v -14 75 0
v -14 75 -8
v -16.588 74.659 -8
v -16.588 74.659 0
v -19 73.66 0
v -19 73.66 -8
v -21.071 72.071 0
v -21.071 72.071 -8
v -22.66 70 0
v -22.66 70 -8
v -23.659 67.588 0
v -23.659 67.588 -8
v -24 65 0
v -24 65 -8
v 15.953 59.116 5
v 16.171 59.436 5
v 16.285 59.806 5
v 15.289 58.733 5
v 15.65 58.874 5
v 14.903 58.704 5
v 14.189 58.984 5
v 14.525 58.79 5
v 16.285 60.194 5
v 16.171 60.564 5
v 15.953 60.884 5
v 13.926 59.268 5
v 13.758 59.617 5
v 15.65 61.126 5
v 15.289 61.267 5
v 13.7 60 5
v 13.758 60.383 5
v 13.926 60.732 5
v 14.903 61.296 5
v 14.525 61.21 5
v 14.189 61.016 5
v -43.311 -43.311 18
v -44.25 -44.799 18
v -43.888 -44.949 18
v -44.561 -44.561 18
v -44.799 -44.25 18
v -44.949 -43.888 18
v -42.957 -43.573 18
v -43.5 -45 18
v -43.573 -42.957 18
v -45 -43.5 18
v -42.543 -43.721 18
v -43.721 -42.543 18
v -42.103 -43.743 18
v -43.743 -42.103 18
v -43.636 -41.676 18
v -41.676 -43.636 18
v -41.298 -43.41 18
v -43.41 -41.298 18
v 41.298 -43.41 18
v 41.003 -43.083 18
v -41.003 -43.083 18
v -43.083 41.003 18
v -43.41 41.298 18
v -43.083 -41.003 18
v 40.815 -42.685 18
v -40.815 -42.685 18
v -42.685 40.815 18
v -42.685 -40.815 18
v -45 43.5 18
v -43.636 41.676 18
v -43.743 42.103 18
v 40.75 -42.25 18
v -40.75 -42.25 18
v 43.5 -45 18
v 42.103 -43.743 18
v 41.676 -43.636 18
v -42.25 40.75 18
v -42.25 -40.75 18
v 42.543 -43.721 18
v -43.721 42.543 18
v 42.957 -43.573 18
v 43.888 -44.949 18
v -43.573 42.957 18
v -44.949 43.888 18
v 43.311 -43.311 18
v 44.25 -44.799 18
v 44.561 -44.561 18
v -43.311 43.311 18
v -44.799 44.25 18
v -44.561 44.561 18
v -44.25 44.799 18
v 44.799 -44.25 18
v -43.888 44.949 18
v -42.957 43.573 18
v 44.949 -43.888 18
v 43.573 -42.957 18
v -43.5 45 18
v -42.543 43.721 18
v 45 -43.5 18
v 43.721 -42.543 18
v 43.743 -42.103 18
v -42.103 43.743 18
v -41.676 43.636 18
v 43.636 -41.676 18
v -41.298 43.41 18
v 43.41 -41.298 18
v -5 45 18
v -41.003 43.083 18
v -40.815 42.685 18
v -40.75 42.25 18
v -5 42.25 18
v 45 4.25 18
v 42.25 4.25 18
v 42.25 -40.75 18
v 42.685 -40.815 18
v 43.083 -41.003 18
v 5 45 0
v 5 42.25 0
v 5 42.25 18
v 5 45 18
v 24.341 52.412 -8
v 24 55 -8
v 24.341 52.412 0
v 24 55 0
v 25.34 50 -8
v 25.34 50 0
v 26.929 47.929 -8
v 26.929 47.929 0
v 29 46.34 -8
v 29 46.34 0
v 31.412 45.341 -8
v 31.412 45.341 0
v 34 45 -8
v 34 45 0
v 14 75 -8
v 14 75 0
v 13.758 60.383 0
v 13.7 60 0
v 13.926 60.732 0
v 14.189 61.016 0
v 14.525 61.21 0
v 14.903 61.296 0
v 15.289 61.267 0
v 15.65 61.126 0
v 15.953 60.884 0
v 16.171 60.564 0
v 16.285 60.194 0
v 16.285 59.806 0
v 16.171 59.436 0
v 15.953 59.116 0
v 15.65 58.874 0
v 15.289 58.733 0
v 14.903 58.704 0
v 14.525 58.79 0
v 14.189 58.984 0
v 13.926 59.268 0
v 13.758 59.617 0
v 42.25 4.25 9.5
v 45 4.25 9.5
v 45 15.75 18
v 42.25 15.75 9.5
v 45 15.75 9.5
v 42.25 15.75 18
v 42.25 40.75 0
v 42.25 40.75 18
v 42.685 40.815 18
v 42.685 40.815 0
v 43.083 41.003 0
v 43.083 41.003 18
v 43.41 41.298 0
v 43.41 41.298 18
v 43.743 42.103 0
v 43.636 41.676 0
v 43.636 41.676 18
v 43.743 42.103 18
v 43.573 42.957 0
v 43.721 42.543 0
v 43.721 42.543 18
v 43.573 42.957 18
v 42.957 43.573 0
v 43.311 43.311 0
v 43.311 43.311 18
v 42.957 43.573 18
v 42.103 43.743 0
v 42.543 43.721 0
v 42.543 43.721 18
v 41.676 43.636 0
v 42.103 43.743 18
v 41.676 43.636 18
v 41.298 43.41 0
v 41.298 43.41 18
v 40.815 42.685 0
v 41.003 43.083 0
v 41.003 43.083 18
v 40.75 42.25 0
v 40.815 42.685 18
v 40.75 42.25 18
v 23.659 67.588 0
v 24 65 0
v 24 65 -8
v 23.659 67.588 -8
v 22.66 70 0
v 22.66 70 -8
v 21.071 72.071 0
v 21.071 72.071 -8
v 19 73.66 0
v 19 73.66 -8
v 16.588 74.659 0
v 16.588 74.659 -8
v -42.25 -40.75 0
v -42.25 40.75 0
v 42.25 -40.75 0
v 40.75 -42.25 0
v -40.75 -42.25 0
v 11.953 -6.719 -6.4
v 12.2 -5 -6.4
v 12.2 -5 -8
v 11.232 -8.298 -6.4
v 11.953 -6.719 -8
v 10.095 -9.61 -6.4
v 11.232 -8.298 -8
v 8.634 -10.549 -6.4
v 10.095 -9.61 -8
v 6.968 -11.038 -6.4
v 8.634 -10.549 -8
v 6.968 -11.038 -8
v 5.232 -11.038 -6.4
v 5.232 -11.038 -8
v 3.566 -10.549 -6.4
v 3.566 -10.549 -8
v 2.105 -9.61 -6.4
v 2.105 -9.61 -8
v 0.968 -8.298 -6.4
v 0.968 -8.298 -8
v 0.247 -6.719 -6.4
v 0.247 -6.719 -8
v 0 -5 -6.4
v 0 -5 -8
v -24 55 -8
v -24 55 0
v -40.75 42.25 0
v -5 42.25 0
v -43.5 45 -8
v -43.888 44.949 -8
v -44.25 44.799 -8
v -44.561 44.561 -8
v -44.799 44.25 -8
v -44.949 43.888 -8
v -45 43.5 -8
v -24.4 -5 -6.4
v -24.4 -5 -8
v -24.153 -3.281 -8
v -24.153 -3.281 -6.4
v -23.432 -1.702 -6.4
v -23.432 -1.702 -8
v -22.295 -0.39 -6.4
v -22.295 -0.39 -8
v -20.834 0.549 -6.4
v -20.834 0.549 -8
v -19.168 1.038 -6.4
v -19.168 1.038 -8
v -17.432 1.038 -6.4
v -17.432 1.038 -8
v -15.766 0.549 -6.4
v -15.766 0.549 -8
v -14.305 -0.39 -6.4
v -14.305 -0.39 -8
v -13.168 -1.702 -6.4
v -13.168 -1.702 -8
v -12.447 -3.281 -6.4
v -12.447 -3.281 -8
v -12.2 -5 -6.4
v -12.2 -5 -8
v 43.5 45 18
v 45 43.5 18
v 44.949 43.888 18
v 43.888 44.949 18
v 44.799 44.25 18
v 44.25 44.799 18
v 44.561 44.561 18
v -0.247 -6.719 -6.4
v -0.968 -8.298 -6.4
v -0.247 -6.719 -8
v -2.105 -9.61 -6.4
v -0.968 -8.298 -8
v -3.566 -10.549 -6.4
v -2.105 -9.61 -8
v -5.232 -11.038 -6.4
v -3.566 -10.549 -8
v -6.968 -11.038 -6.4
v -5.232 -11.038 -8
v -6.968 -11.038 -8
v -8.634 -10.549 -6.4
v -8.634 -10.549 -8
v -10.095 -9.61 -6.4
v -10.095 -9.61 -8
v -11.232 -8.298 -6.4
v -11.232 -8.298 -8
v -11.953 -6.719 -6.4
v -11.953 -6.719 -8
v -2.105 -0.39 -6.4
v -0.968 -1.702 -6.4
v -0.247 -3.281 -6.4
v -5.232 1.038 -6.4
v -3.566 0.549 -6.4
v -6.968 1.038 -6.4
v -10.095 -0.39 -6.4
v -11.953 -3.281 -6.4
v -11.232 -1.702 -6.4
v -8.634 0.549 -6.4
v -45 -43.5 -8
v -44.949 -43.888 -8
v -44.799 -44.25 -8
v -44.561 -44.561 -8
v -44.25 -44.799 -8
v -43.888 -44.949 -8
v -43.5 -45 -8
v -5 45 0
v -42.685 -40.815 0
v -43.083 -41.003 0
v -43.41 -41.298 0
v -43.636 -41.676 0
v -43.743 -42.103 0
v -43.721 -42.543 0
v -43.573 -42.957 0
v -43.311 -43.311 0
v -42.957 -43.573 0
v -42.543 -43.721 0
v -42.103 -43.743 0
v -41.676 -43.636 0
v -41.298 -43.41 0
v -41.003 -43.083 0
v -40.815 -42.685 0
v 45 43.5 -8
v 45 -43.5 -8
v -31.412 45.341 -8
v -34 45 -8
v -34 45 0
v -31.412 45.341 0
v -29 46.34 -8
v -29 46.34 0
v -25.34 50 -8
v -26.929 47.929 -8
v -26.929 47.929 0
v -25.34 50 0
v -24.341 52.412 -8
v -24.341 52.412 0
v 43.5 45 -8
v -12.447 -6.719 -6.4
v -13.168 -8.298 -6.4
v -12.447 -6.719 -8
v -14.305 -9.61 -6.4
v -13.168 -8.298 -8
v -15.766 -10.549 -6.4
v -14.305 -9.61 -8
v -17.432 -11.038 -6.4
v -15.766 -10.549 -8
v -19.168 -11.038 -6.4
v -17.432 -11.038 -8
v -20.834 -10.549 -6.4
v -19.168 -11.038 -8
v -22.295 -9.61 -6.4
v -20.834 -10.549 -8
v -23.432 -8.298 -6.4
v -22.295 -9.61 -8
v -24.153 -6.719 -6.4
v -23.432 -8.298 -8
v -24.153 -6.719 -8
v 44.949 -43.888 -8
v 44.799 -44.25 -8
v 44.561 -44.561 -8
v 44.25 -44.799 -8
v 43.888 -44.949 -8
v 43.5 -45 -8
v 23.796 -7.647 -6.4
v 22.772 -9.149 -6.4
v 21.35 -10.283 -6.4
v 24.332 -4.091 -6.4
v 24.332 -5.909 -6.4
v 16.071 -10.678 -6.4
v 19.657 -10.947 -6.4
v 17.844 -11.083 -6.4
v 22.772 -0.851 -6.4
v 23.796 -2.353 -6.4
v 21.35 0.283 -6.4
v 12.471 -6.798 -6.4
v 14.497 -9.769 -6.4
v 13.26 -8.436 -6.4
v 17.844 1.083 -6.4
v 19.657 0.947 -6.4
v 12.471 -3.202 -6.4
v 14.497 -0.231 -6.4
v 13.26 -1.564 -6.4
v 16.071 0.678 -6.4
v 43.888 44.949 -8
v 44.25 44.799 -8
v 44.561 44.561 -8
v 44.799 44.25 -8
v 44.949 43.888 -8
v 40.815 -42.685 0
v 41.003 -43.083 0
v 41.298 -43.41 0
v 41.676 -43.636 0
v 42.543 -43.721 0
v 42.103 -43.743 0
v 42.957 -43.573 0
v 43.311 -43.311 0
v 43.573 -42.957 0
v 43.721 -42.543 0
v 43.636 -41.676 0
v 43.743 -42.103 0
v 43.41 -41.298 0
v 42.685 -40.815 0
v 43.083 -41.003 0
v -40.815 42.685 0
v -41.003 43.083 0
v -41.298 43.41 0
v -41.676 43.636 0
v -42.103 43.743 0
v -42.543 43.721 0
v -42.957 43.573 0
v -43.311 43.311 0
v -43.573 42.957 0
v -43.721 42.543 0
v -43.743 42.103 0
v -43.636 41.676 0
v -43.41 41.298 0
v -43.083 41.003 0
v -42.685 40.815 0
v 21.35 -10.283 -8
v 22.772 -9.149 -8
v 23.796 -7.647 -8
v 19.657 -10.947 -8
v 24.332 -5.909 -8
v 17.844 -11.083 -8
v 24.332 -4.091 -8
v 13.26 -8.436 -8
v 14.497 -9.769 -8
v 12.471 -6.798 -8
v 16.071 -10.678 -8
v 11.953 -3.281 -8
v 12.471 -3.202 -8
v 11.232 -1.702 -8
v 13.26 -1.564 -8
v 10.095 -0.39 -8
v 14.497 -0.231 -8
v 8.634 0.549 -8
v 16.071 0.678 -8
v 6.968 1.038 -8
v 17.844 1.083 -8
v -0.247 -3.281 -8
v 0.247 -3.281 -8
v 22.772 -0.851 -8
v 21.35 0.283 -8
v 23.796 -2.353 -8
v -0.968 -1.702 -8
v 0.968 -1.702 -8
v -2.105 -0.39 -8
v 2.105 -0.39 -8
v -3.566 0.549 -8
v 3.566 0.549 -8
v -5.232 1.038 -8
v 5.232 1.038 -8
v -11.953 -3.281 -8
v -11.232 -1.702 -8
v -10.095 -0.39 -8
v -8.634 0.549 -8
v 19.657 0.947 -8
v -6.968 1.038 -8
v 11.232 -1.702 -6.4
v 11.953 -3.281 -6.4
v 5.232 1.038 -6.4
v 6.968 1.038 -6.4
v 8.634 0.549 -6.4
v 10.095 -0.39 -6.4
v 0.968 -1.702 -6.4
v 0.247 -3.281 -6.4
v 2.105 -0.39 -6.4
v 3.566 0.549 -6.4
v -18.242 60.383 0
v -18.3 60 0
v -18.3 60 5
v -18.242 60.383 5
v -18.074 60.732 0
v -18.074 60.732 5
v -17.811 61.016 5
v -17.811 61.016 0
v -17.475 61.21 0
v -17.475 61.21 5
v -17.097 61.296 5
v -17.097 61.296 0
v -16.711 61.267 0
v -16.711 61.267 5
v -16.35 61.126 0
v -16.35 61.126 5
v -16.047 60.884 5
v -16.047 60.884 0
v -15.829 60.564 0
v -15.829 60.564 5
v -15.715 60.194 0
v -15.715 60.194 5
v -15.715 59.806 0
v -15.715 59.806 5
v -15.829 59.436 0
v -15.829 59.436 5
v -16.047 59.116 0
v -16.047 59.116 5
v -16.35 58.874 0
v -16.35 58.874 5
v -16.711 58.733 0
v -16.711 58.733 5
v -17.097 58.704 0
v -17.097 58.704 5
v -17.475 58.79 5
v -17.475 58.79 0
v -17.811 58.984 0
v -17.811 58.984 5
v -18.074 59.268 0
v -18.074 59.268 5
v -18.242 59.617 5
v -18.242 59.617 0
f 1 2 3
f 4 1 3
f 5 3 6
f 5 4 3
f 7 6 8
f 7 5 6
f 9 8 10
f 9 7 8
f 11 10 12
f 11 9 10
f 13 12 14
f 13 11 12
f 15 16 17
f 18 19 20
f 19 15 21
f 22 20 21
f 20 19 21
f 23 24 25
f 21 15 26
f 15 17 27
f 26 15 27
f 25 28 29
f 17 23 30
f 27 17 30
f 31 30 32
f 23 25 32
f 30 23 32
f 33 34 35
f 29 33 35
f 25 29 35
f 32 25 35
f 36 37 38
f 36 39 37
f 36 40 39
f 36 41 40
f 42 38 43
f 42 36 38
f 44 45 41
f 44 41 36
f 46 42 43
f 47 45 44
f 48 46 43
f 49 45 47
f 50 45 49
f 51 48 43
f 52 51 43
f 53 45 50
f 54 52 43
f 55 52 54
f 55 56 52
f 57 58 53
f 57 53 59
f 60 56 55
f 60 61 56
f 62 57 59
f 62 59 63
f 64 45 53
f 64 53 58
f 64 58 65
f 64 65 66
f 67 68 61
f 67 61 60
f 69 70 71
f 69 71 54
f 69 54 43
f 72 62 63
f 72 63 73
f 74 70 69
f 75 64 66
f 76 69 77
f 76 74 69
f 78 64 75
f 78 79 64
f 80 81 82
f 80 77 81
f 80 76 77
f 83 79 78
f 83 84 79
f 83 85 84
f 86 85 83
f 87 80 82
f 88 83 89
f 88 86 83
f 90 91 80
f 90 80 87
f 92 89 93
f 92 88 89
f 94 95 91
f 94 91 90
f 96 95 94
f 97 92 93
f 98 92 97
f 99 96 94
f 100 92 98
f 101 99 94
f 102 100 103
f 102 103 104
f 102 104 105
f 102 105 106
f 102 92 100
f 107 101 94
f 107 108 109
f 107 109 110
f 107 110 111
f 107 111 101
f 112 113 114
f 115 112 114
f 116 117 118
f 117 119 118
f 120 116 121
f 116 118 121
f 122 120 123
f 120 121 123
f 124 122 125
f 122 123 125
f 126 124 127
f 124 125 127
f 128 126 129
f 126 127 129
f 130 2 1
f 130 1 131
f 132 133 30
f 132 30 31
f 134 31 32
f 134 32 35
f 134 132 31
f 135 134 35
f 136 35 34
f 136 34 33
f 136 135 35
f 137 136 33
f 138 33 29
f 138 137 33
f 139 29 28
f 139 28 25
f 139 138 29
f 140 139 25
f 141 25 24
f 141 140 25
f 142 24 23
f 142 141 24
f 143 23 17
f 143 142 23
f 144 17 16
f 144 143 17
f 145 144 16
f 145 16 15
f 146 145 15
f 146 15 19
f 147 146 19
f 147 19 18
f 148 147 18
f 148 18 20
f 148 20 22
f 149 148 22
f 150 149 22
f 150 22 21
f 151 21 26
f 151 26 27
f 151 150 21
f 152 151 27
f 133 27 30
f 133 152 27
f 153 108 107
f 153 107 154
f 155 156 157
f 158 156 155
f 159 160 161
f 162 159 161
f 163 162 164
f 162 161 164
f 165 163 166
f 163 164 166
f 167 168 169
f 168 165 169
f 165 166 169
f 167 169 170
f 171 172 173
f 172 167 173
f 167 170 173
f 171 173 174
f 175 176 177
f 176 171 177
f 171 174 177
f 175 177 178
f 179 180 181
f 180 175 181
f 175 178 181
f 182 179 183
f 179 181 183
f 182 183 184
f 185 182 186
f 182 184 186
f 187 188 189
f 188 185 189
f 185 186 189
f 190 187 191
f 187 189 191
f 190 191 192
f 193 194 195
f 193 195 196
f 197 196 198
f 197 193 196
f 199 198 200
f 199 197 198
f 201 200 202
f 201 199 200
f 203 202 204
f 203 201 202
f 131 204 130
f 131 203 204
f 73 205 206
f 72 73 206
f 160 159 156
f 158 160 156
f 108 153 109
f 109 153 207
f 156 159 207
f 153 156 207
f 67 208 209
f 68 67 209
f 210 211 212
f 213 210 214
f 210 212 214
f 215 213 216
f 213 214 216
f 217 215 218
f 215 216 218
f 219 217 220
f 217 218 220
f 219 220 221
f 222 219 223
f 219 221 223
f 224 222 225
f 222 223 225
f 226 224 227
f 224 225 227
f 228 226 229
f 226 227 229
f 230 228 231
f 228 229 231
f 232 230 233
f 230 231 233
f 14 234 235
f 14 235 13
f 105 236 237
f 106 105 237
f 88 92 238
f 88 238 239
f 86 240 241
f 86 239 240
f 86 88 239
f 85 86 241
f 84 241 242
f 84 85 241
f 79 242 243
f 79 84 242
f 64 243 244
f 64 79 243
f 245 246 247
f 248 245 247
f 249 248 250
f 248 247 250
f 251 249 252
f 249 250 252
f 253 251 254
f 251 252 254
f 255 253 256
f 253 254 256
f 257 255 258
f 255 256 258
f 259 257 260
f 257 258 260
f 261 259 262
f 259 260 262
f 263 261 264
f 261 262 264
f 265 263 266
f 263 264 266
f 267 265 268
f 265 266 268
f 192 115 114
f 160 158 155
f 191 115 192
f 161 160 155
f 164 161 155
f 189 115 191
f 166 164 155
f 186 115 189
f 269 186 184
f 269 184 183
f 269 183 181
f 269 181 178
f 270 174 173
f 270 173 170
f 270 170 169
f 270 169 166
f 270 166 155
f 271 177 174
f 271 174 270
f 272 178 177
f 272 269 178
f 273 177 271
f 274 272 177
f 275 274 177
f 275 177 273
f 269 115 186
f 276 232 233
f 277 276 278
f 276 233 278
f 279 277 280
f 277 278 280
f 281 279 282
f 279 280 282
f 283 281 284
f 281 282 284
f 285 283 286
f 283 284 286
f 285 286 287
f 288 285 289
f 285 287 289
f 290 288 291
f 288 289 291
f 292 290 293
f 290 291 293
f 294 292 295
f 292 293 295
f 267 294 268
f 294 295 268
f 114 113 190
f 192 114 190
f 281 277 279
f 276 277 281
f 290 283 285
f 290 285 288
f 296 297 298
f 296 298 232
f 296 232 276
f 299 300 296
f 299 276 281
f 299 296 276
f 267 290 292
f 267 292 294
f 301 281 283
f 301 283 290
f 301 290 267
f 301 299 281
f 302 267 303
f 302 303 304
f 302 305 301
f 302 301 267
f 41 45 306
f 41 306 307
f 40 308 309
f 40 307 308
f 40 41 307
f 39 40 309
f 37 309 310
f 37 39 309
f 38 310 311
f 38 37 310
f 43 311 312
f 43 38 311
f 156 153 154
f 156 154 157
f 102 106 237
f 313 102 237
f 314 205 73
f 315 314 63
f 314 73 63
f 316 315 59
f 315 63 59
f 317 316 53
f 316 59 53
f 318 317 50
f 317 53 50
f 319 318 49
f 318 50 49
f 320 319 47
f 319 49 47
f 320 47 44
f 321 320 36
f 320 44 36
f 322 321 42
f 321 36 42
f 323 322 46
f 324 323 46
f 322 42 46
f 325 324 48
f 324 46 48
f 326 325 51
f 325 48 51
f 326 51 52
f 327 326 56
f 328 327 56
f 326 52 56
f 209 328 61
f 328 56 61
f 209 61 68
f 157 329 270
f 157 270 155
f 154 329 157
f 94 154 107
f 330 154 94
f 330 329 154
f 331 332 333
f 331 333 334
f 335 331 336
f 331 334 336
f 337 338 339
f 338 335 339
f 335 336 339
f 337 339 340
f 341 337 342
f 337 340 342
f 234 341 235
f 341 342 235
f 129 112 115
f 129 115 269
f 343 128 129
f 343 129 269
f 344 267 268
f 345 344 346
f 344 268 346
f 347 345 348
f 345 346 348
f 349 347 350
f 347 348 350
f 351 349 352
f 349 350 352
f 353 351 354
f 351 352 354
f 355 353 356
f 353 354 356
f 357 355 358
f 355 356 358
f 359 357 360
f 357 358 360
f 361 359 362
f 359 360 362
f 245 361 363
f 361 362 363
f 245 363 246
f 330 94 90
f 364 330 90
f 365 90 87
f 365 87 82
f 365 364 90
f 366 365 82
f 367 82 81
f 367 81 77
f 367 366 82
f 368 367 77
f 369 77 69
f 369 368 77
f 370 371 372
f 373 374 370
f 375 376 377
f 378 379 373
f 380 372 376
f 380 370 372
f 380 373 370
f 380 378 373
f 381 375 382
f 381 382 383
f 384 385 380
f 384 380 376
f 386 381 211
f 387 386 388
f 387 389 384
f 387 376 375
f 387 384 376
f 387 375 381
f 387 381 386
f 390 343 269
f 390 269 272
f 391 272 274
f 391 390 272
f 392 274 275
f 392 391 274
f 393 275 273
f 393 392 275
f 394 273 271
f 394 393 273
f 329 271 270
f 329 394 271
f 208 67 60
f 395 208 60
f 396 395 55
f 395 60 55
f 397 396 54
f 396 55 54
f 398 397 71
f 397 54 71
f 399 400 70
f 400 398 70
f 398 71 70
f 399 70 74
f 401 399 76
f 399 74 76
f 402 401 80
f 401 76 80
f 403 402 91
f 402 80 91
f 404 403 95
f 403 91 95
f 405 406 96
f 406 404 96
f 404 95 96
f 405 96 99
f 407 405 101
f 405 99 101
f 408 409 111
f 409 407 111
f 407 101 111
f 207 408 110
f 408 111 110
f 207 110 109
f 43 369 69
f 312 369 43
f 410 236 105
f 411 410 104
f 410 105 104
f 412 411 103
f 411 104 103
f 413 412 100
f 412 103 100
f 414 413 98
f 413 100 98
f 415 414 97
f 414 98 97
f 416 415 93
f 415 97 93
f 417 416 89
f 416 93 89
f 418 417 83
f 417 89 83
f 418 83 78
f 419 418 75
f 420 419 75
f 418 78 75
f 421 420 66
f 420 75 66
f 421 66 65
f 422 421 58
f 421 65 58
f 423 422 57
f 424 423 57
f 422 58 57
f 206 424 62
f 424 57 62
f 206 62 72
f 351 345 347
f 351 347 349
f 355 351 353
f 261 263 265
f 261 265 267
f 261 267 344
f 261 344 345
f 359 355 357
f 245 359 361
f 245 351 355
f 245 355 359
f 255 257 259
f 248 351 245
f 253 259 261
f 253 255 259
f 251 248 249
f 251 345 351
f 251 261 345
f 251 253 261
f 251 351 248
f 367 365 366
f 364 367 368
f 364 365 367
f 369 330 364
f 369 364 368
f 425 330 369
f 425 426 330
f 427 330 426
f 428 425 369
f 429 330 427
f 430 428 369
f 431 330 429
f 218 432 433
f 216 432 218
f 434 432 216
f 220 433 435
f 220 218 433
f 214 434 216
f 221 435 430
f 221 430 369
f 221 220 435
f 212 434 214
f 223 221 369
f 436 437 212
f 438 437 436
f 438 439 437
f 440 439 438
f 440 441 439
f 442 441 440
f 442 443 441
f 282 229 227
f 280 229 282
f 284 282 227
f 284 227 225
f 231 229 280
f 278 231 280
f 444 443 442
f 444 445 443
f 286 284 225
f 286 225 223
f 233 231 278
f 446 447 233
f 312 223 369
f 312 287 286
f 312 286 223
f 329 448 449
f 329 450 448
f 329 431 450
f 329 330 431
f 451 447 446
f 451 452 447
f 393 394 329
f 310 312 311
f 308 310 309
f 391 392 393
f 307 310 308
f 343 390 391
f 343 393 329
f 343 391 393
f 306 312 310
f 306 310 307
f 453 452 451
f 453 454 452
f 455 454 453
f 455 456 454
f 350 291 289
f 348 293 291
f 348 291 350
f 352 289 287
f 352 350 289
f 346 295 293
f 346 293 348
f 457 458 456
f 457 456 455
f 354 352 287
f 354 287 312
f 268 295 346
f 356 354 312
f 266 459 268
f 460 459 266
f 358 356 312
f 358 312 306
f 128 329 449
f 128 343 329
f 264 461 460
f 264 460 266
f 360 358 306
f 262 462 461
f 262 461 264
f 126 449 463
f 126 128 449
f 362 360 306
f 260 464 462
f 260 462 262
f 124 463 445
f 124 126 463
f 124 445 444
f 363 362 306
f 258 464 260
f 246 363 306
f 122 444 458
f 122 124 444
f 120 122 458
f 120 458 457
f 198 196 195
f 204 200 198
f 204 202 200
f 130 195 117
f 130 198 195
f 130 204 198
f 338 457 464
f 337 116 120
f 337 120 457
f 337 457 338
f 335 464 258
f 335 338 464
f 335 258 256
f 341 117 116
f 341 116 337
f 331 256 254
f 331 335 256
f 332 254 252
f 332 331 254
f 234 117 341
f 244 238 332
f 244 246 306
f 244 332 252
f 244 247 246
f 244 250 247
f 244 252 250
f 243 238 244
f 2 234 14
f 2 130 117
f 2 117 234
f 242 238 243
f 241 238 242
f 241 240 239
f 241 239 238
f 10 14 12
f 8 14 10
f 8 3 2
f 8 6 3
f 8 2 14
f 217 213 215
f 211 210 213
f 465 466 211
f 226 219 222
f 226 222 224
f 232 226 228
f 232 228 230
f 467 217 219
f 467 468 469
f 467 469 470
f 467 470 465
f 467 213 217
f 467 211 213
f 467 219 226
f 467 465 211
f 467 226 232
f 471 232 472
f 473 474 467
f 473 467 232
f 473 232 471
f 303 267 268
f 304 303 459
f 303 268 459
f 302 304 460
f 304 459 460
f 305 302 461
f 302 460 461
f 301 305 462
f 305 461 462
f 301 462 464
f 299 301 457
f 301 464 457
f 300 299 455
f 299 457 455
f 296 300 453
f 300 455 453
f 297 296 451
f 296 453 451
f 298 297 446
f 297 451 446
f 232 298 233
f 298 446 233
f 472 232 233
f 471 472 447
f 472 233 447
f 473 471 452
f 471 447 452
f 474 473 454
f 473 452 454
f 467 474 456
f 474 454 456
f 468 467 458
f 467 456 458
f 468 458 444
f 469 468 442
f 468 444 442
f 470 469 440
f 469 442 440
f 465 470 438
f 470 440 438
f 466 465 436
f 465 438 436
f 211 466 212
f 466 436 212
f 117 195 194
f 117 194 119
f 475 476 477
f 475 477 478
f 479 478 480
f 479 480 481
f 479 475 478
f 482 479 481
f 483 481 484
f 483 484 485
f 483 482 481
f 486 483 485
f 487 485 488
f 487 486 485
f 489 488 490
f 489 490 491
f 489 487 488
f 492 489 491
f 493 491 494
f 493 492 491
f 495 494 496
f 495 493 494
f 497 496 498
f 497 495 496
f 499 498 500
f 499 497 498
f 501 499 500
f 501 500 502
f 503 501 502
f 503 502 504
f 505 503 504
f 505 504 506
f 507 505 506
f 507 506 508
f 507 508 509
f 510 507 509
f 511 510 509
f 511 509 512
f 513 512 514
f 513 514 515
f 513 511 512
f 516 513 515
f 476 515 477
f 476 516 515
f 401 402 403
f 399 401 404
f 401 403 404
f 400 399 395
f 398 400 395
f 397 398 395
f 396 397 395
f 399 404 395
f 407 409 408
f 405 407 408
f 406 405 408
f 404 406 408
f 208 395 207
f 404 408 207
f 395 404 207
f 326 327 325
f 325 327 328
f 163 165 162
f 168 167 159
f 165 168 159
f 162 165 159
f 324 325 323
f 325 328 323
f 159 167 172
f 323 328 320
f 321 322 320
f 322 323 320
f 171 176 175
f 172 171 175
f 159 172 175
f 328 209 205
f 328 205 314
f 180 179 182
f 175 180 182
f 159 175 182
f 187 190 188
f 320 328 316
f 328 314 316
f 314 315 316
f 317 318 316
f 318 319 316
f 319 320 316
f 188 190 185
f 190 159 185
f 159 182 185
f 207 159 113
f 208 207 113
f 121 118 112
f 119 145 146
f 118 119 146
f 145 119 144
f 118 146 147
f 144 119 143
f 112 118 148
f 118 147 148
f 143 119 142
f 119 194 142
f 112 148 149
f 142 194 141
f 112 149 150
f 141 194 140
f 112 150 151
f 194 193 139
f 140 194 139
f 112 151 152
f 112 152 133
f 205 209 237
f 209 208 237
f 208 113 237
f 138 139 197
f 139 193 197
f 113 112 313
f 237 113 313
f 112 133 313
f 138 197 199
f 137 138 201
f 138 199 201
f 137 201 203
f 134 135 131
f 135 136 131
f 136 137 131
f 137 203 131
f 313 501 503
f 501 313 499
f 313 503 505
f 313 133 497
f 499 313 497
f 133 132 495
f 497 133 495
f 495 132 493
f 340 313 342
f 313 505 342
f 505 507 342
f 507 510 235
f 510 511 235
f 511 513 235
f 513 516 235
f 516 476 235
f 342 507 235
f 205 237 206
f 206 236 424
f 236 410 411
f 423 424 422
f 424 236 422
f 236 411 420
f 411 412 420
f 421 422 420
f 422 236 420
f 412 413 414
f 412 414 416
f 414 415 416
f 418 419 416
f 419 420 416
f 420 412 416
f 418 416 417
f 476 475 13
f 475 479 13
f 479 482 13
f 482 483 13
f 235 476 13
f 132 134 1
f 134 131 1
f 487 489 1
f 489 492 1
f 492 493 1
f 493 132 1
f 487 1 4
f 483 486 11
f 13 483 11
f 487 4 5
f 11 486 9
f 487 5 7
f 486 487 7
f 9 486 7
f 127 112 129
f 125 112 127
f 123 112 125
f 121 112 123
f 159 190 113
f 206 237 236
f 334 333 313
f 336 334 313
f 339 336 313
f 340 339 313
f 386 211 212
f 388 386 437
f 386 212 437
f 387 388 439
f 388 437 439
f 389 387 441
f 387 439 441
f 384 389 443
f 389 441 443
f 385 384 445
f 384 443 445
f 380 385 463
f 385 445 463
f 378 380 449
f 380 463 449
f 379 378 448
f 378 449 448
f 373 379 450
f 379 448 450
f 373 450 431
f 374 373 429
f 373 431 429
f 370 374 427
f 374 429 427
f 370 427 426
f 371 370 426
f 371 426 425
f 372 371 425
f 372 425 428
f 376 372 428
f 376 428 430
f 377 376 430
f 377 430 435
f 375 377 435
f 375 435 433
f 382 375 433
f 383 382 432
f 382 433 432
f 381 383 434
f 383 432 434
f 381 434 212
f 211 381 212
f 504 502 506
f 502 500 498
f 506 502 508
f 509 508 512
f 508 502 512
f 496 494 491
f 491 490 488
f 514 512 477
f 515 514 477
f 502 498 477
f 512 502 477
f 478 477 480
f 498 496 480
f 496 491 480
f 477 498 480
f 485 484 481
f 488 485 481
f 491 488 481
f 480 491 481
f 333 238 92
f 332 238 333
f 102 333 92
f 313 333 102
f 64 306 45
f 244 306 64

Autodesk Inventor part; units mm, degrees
ref_plane "YZ Plane" through (0, 0, 0) normal (1, 0, 0) x (0, 1, 0)
ref_plane "XZ Plane" through (0, 0, 0) normal (0, 1, 0) x (-1, 0, 0)
ref_plane "XY Plane" through (0, 0, 0) normal (0, 0, 1) x (1, 0, 0)
sketch "Sketch1" plane through (0, 0, 0) normal (0, 0, 1) x (1, 0, 0)
  line L0 (-42.25, 42.25) -> (42.25, 42.25)
  line L1 (42.25, 42.25) -> (42.25, -42.25)
  line L2 (42.25, -42.25) -> (-42.25, -42.25)
  line L3 (-42.25, -42.25) -> (-42.25, 42.25)
  line L4 (-42.25, 42.25) -> (42.25, -42.25) construction
  line L5 (42.25, 42.25) -> (-42.25, -42.25) construction
  line L6 (-45, 45) -> (45, 45)
  line L7 (45, 45) -> (45, -45)
  line L8 (45, -45) -> (-45, -45)
  line L9 (-45, -45) -> (-45, 45)
  line L10 (-45, 45) -> (45, -45) construction
  line L11 (45, 45) -> (-45, -45) construction
  point P0 (0, 0)
  dimension "d0" = 84.5
  dimension "d1" = 84.5
  dimension "d2" = 90
  dimension "d3" = 90
extrude "Extrusion1" add sketch "Sketch1" along normal blind 18
extrude "Extrusion2" add sketch "Sketch1" against normal blind 8 contours L0 L1 L2 L3 | L6 L7 L8 L9
sketch "Sketch2" plane through (0, 0, 18) normal (0, 0, 1) x (1, 0, 0)
  line L0 (42.25, -42.25) -> (42.25, 42.25) projected
  line L1 (42.25, 42.25) -> (-42.25, 42.25) projected
  line L2 (-42.25, 42.25) -> (-42.25, -42.25) projected
  line L3 (-42.25, -42.25) -> (42.25, -42.25) projected
  circle A0 centre (42.25, -42.25) radius 1.5
  line L4 (42.25, -42.25) -> (-42.25, -42.25) projected
  circle A1 centre (-42.25, -42.25) radius 1.5
  circle A2 centre (42.25, 42.25) radius 1.5
  line L5 (-42.25, 42.25) -> (42.25, 42.25) projected
  circle A3 centre (-42.25, 42.25) radius 1.5
  point P0 (0, 0)
  dimension "d8" = 3
  dimension "d9" = 3
  dimension "d10" = 3
  dimension "d11" = 3
extrude "Extrusion3" cut sketch "Sketch2" against normal up to surface (18 mm away) contours L3 A0 L0 | L0 A0 L3 | A2 L1 L0 | L0 L1 A2 | A1 L2 L3 | L3 L2 A1 | A3 L2 L1 | L1 L2 A3
sketch "Sketch3" plane through (42.25, -40.75, 0) normal (-1, 0, 0) x (0, 0, 1)
  line L0 (18, 81.5) -> (0, 81.5) projected
  line L1 (0, 0) -> (0, 81.5) projected
  line L2 (0, 0) -> (18, 0) projected
  line L3 (18, 81.5) -> (18, 0) projected
  line L4 (9.5, 56.5) -> (19.5, 56.5)
  line L5 (19.5, 56.5) -> (19.5, 45)
  line L6 (19.5, 45) -> (9.5, 45)
  line L7 (9.5, 45) -> (9.5, 56.5)
  point P0 (0, 40.75)
  dimension "d14" = 10
  dimension "d15" = 11.5
  dimension "d16" = 25
  dimension "d17" = 9.5
extrude "Extrusion4" cut sketch "Sketch3" against normal blind 10 contours L4 L5 L6 L3 | L3 L6 L7 L4
sketch "Sketch4" plane through (-40.75, 42.25, 0) normal (0, -1, 0) x (1, 0, 0)
  line L0 (0, 18) -> (0, 0) projected
  line L1 (81.5, 0) -> (0, 0) projected
  line L2 (81.5, 0) -> (81.5, 18) projected
  line L3 (0, 18) -> (81.5, 18) projected
  line L4 (0, 18) -> (81.5, 18) projected
  line L5 (81.5, 0) -> (0, 0) projected
  line L6 (45.75, 18) -> (35.75, 18)
  line L7 (35.75, 18) -> (35.75, 0)
  line L8 (35.75, 0) -> (45.75, 0)
  line L9 (45.75, 0) -> (45.75, 18)
  point P0 (40.75, 18)
  point P1 (40.75, 18)
  dimension "d22" = 10
extrude "Extrusion5" cut sketch "Sketch4" against normal up to surface (2.75 mm away) contours L3 L9 L1 L7
sketch "Sketch5" plane through (0, 0, -8) normal (0, 0, -1) x (-1, 0, 0)
  line L0 (45, 45) -> (-45, 45) projected
  line L1 (-45, 45) -> (-45, -45) projected
  line L2 (-45, -45) -> (45, -45) projected
  line L3 (45, -45) -> (45, 45) projected
  line L4 (-24, 45) -> (24, 45)
  line L5 (24, 45) -> (24, 75)
  line L6 (24, 75) -> (-24, 75)
  line L7 (-24, 75) -> (-24, 45)
  circle A0 centre (-15, 60) radius 1.3
  circle A1 centre (17, 60) radius 1.3
  point P0 (0, 0)
  point P1 (0, 45)
  point P2 (-24, 60)
  dimension "d25" = 48
  dimension "d26" = 30
  dimension "d27" = 2.6
  dimension "d28" = 2.6
  dimension "d29" = 32
extrude "Extrusion6" add sketch "Sketch5" against normal up to surface (8 mm away) contours L0 L7 L6 L5
extrude "Extrusion7" add sketch "Sketch5" against normal blind 13 contours A0 | A1
fillet "Fillet1" radius 10 4 edges at (24, 75, -4) (-24, 75, -4) (24, 45, -4) (-24, 45, -4)
fillet "Fillet2" radius 1.5 4 edges at (45, 45, 5) (-45, 45, 5) (45, -45, 5) (-45, -45, 5)
sketch "Sketch6" plane through (0, 0, -8) normal (0, 0, -1) x (-1, 0, 0)
  circle A0 centre (18.3, -5) radius 6.1
  circle A1 centre (6.1, -5) radius 6.1
  circle A2 centre (-6.1, -5) radius 6.1
  circle A3 centre (-18.3, -5) radius 6.1
  line L0 (-43.5, -45) -> (43.5, -45) projected
  point P0 (0, 0)
  point P1 (0, -5)
  point P2 (0, -45)
  dimension "d38" = 12.2
  dimension "d39" = 12.2
  dimension "d37" = 12.2
  dimension "d40" = 12.2
  dimension "d41" = 40
extrude "Extrusion8" cut sketch "Sketch6" against normal blind 1.6
properties part number "base"
